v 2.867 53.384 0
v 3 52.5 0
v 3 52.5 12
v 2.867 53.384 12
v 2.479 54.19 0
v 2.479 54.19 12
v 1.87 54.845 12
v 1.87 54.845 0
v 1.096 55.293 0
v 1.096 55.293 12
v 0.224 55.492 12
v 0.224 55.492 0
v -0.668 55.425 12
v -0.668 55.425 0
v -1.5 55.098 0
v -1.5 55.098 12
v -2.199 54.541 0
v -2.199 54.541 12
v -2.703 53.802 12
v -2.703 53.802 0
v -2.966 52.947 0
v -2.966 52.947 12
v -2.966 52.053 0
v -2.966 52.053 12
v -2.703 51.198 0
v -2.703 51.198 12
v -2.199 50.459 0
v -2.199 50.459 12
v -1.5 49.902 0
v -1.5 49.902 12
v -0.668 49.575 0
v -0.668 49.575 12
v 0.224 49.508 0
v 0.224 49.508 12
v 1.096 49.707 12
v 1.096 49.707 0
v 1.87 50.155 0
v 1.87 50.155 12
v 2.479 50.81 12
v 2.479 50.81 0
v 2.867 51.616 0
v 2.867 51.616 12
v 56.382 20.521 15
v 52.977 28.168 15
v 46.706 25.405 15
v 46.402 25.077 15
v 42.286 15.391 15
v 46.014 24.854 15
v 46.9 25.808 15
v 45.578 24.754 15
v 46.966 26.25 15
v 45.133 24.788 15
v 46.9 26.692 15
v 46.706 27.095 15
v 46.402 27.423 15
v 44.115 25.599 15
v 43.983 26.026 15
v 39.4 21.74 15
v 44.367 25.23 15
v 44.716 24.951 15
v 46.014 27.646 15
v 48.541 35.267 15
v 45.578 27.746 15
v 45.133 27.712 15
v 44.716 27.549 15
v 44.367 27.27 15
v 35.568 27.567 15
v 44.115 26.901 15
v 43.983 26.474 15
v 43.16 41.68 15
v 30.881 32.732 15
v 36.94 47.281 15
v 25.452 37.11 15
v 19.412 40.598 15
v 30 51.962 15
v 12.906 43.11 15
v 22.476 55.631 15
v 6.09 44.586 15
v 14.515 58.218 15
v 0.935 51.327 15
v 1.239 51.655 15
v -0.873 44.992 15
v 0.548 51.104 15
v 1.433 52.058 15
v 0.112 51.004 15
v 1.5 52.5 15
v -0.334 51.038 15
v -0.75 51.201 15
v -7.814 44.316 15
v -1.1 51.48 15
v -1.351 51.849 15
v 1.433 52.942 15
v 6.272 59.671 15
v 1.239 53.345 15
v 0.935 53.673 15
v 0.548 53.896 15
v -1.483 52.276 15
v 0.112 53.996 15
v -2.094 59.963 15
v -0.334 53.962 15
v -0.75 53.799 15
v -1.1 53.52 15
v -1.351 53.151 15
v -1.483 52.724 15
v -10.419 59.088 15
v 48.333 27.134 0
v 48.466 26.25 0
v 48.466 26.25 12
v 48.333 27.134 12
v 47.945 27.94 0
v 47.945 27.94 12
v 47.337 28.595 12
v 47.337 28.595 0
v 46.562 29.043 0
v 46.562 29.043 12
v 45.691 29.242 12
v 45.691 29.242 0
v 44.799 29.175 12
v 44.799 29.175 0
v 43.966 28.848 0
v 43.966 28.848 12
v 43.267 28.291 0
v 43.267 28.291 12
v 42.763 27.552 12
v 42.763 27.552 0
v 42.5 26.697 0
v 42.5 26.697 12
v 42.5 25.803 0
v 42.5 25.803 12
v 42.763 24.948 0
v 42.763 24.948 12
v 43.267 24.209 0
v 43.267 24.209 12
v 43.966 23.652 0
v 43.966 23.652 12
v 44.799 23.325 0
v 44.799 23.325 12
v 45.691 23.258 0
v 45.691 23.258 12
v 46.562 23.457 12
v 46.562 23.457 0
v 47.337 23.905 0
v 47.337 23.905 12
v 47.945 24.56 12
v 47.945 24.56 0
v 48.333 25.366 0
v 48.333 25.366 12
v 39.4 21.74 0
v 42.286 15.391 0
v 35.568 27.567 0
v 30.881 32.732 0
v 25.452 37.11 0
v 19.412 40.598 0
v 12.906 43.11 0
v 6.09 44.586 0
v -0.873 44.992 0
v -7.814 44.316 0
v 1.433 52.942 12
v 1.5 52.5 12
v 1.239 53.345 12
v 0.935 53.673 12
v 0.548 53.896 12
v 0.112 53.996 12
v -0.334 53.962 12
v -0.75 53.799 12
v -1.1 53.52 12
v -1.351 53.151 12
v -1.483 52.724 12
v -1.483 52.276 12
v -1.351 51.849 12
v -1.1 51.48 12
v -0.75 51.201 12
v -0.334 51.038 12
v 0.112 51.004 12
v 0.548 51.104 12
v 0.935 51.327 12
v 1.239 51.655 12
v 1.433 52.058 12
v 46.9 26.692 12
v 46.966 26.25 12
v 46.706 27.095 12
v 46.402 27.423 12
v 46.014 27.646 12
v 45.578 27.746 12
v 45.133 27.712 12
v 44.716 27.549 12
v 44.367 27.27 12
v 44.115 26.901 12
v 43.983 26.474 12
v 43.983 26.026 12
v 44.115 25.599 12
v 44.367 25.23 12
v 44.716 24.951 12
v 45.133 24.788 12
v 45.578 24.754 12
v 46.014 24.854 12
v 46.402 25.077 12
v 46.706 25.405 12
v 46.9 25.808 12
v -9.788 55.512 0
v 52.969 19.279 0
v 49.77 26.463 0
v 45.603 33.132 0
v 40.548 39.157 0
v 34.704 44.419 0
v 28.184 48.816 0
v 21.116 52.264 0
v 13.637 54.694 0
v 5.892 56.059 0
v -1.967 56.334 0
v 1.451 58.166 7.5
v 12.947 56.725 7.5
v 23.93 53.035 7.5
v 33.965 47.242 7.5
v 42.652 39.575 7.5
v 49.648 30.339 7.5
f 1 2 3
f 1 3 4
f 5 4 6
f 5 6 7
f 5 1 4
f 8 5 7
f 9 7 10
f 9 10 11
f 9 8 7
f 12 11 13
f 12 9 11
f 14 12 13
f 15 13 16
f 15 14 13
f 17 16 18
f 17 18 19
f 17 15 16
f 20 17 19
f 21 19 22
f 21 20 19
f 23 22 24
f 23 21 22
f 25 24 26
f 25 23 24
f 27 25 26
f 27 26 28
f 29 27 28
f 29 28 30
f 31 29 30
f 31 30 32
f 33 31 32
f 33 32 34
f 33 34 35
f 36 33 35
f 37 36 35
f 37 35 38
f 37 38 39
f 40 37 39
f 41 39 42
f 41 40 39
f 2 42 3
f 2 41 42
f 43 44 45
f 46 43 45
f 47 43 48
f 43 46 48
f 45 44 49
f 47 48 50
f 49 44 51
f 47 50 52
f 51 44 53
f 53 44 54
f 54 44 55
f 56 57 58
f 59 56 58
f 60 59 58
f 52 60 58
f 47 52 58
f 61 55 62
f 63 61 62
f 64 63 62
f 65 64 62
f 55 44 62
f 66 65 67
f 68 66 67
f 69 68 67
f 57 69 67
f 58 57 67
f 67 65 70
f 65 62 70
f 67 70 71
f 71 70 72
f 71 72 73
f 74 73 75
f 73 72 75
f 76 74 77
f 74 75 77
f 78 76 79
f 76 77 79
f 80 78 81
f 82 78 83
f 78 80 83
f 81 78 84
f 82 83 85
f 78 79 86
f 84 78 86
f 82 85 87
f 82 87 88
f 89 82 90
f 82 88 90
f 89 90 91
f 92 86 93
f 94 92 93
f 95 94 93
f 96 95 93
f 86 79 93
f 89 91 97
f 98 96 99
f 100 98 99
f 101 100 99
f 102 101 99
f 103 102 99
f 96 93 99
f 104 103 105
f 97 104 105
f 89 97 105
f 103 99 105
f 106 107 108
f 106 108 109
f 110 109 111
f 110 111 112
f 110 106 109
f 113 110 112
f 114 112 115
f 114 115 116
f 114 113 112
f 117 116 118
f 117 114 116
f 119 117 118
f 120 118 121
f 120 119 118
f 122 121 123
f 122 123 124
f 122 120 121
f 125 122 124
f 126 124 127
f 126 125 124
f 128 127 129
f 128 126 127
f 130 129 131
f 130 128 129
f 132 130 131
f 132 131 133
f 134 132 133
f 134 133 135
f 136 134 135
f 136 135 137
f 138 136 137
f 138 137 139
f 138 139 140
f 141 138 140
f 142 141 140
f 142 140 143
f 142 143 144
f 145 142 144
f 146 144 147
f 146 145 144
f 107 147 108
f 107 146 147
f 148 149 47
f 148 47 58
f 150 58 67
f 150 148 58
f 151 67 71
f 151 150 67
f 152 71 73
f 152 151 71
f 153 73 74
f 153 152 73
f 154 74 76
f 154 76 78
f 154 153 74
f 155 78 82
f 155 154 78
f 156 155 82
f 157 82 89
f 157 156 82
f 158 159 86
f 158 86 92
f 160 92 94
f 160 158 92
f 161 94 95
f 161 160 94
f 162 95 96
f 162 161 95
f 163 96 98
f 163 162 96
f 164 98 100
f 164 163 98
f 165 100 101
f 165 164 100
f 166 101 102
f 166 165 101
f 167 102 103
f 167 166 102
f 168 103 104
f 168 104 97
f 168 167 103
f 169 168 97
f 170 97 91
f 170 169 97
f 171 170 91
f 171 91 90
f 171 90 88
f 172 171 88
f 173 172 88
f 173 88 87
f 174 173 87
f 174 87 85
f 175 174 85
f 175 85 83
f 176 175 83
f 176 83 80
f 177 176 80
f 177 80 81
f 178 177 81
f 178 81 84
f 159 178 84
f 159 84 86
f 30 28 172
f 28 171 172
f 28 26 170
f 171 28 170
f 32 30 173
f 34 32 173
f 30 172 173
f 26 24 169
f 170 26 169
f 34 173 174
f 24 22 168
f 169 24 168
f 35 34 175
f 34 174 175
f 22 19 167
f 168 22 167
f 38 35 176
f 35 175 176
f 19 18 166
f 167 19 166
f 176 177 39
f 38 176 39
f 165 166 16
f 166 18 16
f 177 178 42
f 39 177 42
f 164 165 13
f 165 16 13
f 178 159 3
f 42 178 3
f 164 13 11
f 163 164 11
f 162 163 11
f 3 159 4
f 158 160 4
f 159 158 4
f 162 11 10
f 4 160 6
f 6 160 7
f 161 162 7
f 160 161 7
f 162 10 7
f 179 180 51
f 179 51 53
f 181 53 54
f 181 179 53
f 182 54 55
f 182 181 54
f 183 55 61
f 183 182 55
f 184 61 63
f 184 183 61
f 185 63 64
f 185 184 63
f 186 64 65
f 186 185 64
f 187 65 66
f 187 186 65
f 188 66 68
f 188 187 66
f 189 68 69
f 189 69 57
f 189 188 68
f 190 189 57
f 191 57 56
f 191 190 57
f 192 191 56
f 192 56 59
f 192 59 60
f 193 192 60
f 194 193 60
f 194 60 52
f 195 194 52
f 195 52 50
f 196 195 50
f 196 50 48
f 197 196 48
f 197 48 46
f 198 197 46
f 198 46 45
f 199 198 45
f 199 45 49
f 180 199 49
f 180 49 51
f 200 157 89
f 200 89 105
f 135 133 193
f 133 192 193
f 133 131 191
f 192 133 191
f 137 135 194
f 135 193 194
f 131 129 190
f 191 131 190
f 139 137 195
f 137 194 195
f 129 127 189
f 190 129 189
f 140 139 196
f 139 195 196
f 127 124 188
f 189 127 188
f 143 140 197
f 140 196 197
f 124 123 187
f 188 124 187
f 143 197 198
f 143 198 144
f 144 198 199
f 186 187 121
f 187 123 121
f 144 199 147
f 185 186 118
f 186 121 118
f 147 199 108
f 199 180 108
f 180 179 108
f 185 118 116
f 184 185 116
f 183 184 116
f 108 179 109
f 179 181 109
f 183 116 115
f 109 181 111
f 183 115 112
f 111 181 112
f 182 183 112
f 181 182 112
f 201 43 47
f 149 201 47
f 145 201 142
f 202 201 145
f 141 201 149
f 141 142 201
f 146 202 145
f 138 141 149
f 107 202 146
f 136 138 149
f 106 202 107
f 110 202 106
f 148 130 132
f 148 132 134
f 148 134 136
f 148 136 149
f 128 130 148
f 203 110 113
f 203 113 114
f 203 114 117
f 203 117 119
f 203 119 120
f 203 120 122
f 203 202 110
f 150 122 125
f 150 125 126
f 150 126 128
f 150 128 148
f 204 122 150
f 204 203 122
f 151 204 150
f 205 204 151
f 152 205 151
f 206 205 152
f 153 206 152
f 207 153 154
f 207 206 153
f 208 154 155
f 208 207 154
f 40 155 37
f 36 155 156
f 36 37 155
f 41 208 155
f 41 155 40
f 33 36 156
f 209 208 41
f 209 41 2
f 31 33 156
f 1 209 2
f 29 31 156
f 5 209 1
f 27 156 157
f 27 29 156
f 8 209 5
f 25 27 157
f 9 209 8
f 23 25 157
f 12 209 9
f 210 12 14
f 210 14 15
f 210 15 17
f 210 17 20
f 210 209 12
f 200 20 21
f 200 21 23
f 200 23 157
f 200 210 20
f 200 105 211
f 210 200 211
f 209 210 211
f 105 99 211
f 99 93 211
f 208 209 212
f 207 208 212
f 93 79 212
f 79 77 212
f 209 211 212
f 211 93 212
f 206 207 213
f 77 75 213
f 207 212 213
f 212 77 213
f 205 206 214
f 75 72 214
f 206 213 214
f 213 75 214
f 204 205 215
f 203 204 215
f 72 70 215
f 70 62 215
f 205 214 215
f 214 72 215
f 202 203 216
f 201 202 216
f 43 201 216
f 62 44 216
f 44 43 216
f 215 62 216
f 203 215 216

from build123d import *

# Parameters (mm, degrees)
SKETCH_1_R          = 1.5
EXTRUDE_1_DEPTH     = 15
SKETCH_2_R          = 3
CUT_EXTRUDE_1_DEPTH = 12


with BuildPart() as part:
    # 草图1 → 凸台-拉伸1 (new body)
    with BuildSketch(Plane.XY):
        with BuildLine():
            ThreePointArc((42.286167935, 15.39090645), (22.5, 38.97114317), (-7.814167995, 44.316348886))
            Line((-7.814167995, 44.316348886), (-10.41889066, 59.088465181))
            ThreePointArc((-10.41889066, 59.088465181), (30, 51.961524227), (56.381557247, 20.5212086))
            Line((56.381557247, 20.5212086), (42.286167935, 15.39090645))
        make_face()
        with Locations((45.466333699, 26.25)):
            Circle(SKETCH_1_R, mode=Mode.SUBTRACT)
        with Locations((0, 52.5)):
            Circle(SKETCH_1_R, mode=Mode.SUBTRACT)
    extrude(amount=EXTRUDE_1_DEPTH)

    # 草图2 → 切除-拉伸1 (cut)
    with BuildSketch(Plane.XY):
        with Locations((0, 52.5)):
            Circle(SKETCH_2_R)
        with Locations((45.466333699, 26.25)):
            Circle(SKETCH_2_R)
    extrude(amount=CUT_EXTRUDE_1_DEPTH, mode=Mode.SUBTRACT)

    # 草图6 → 切除-旋转1 (revolve, cut)
    with BuildSketch(Plane(origin=(0, 0, 0), x_dir=(0, 0, 1), z_dir=(-0.9848077530122092, -0.1736481776669239, 0))):
        Polygon((0, 60), (0, 56.36802701), (15, 60), align=None)
    revolve(axis=Axis((0, 0, 0), (0, 0, -1)), mode=Mode.SUBTRACT)


solid = part.part
